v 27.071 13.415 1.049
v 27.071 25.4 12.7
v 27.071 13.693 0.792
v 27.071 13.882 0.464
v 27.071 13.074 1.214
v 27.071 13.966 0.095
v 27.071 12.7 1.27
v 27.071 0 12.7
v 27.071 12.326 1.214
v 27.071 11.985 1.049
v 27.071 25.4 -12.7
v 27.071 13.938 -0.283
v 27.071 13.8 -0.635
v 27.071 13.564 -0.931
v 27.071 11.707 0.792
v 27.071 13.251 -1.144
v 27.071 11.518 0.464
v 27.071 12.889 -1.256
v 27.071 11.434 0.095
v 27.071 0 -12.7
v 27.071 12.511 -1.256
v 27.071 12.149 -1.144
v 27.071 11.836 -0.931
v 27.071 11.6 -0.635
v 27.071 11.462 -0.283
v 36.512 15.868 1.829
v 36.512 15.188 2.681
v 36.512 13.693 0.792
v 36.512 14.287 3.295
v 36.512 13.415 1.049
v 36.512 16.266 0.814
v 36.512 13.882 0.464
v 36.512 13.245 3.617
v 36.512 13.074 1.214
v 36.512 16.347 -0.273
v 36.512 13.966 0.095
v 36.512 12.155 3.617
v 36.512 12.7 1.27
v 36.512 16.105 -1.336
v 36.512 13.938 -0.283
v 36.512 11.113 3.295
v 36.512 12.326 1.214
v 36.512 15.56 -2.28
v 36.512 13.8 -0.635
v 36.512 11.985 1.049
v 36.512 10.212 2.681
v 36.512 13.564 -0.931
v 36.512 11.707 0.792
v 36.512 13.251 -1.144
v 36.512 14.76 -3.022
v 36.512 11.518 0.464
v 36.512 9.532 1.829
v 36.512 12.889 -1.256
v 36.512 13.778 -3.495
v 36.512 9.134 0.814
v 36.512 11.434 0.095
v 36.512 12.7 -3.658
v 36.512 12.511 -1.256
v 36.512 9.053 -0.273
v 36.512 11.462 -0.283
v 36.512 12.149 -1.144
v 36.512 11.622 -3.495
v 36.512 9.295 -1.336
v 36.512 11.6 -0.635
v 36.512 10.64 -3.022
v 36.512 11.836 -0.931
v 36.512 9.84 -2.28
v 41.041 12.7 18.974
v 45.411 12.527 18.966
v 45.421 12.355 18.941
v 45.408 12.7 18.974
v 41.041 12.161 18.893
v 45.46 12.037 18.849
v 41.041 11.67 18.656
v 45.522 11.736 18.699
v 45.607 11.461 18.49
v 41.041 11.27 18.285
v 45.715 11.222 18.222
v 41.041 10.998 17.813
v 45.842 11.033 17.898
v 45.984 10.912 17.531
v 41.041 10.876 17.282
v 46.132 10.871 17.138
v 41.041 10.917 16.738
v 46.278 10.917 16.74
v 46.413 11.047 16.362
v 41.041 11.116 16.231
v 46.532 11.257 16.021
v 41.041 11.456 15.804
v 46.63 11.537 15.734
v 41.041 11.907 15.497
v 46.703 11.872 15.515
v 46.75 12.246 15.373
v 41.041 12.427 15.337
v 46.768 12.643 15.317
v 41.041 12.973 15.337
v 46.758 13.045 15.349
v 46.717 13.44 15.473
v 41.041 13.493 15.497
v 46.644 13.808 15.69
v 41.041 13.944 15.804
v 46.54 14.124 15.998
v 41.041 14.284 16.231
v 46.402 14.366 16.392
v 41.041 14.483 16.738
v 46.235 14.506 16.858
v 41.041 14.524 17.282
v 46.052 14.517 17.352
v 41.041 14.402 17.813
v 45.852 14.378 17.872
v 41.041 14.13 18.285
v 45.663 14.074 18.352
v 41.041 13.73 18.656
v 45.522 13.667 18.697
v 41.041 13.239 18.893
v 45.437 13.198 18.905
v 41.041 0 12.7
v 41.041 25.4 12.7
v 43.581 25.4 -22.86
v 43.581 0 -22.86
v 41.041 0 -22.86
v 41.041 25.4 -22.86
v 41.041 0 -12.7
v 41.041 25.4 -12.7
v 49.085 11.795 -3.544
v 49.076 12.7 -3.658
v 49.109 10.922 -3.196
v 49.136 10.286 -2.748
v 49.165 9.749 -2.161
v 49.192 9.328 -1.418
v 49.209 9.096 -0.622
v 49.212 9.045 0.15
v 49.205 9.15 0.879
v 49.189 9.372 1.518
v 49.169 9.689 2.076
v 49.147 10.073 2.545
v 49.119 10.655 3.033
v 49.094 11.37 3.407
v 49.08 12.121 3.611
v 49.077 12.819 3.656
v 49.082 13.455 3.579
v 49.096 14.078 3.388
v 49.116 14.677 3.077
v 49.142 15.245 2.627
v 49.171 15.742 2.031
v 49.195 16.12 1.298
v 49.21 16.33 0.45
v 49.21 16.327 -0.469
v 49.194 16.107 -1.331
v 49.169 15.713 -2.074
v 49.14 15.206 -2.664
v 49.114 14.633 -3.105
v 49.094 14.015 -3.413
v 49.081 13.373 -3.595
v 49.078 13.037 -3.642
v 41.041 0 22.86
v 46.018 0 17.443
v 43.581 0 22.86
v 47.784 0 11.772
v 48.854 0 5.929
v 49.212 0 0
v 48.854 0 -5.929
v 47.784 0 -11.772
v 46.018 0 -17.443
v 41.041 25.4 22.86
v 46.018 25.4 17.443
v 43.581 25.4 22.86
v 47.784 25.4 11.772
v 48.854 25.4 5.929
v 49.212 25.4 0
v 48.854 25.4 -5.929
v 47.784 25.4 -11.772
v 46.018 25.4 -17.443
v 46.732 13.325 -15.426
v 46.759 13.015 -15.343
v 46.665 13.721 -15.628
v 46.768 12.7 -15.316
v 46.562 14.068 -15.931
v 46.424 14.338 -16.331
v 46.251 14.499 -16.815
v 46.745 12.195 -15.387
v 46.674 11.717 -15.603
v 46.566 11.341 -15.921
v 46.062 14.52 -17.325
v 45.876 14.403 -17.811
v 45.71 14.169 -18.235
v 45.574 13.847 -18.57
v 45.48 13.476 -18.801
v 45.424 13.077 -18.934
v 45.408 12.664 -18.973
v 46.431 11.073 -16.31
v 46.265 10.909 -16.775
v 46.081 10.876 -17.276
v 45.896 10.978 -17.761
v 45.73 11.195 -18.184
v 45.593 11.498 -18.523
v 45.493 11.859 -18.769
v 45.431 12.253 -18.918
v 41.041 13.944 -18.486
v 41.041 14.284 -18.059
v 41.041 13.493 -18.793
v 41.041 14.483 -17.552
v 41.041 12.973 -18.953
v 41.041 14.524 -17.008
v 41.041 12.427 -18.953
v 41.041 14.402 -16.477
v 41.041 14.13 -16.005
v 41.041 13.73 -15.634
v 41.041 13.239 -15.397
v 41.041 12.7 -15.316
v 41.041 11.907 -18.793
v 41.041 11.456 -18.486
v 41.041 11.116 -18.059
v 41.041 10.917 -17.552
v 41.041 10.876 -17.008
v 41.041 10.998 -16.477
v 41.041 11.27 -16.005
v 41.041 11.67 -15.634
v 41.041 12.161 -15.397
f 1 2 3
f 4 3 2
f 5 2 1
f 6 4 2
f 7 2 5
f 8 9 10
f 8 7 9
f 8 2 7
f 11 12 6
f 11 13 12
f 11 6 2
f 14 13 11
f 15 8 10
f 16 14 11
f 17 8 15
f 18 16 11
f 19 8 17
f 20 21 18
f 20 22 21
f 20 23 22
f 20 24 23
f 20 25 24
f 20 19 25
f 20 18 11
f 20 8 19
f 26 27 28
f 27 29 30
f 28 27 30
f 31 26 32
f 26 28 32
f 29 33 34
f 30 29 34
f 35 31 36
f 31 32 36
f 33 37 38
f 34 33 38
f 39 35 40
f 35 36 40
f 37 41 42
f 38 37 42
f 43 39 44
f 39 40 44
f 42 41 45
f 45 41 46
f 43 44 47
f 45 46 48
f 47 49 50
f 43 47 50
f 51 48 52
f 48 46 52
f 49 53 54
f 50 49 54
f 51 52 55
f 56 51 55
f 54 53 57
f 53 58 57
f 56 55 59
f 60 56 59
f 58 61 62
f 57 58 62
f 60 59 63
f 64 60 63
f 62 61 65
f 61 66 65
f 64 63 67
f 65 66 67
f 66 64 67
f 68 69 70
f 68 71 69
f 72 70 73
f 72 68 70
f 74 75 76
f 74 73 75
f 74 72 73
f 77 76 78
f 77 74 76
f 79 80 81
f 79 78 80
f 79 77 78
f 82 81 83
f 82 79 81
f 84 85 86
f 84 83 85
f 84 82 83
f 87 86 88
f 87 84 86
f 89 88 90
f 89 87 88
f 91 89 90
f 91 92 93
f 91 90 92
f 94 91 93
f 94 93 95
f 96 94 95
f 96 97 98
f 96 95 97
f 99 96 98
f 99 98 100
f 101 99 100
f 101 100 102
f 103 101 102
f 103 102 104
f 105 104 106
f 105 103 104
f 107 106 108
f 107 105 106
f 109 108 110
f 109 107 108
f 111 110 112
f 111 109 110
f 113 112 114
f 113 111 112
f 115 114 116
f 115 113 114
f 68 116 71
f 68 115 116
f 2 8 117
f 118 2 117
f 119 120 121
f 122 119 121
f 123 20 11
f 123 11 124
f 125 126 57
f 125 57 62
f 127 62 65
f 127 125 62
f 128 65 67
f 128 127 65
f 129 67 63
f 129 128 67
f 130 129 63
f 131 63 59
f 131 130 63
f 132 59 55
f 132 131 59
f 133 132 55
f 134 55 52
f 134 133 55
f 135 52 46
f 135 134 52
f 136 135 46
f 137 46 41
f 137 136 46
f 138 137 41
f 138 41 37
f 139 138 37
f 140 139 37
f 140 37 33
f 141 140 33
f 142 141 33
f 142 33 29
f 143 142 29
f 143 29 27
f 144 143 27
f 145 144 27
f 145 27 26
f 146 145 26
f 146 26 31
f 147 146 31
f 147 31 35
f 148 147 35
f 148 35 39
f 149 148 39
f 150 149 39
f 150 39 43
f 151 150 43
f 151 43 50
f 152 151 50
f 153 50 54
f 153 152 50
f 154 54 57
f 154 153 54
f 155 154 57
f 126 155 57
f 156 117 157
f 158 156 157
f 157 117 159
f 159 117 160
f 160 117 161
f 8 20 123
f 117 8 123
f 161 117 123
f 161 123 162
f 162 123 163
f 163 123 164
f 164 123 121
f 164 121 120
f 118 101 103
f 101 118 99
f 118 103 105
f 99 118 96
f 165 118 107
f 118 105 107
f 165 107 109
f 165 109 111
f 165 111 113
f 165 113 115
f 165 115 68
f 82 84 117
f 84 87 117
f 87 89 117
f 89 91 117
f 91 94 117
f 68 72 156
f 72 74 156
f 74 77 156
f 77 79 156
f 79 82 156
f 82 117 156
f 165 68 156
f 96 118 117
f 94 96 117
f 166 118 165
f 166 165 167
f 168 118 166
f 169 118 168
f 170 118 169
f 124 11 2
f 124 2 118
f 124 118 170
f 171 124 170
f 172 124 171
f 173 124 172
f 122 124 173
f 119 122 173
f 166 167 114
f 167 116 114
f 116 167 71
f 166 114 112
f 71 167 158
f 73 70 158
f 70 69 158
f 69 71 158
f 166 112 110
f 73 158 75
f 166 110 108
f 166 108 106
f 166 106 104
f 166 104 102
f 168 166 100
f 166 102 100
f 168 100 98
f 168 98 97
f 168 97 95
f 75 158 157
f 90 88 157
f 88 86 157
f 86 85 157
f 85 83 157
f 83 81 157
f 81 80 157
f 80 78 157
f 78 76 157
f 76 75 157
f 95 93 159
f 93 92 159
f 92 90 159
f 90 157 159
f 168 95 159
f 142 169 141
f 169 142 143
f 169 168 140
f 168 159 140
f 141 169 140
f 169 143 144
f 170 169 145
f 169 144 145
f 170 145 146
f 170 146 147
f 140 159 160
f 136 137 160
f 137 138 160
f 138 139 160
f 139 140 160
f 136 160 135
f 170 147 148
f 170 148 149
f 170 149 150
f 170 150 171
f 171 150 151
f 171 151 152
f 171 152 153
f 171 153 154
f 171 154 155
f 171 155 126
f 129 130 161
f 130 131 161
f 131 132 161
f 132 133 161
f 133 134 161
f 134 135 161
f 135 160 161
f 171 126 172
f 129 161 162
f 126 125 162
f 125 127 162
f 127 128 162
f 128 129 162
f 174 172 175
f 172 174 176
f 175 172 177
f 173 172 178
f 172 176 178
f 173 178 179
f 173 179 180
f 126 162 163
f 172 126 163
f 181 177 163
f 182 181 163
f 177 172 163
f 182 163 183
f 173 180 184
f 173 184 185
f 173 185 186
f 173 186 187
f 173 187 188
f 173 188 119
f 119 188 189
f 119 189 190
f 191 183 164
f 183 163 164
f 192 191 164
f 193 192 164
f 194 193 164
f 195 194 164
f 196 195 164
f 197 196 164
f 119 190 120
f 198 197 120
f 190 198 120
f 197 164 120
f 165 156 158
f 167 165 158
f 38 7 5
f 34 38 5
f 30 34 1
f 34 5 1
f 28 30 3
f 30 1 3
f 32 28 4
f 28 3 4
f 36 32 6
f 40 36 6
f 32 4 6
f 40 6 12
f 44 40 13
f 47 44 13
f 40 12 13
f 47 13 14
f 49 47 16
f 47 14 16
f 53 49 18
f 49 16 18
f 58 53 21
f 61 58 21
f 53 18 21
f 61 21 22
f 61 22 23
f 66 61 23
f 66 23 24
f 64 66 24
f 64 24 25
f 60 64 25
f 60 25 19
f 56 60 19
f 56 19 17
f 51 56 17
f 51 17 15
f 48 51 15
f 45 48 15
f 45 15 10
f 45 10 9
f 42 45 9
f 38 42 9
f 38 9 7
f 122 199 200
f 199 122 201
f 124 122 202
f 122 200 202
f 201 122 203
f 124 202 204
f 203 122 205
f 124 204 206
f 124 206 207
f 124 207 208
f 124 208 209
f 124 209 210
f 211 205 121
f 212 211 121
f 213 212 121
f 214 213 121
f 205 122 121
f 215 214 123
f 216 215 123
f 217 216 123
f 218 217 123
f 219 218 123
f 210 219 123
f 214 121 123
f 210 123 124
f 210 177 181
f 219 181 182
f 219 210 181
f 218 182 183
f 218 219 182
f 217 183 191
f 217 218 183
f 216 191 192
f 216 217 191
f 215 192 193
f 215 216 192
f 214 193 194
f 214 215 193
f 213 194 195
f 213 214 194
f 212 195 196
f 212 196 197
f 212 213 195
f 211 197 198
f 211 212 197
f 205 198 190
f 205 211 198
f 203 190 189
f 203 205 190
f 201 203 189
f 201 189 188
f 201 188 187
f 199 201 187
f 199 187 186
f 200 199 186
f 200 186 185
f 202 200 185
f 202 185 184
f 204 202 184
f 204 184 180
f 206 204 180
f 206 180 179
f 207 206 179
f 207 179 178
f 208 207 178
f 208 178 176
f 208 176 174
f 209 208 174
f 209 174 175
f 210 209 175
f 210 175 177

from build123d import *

# Parameters (mm, degrees)
SKETCH2_W               = 13.97
SKETCH2_H               = 25.4
BOSS_EXTRUDE1_DEPTH     = 25.4
CUT_EXTRUDE2_REACH      = 42.718
CUT_EXTRUDE2_END_RADIUS = 49.2125
SKETCH4_R               = 1.27
CUT_EXTRUDE4_START      = -8.171649
SKETCH11_R              = 3.6576
CUT_EXTRUDE4_DEPTH      = 12.7
CUT_EXTRUDE5_REACH      = 61.913
CUT_EXTRUDE5_END_RADIUS = 49.2125
SKETCH15_R              = 1.8288


with BuildPart() as part:
    # Sketch2 → Boss-Extrude1 (new body)
    with BuildSketch(Plane(origin=(0, 0, 0), x_dir=(1, 0, 0), z_dir=(0, 1, 0))):
        with Locations((34.055850798, 0)):
            Rectangle(SKETCH2_W, SKETCH2_H)
        Polygon((43.580850798, -22.86), (43.580850798, 22.86), (41.040850798, 22.86), (41.040850798, 12.7), (41.040850798, -12.7), (41.040850798, -22.86), align=None)
        with BuildLine():
            Line((43.580850798, 22.86), (43.580850798, -22.86))
            ThreePointArc((43.580850798, -22.86), (49.2125, 0), (43.580850798, 22.86))
        make_face()
    extrude(amount=BOSS_EXTRUDE1_DEPTH)

    # Cut-Extrude2: up to this cylinder (the profile starts inside it)
    cut_extrude2_end = Plane(origin=(0, 12.7, 0), z_dir=(0, -1, 0)) * Cylinder(CUT_EXTRUDE2_END_RADIUS, 184.861, mode=Mode.PRIVATE)
    # Sketch4 → Cut-Extrude2 (cut, up to the surface)
    with BuildSketch(Plane.ZY.offset(-27.070850798), mode=Mode.PRIVATE) as cut_extrude2_sk1:
        with Locations((0, 12.7)):
            Circle(SKETCH4_R)
    cut_extrude2_tool1 = extrude(cut_extrude2_sk1.sketch, amount=-CUT_EXTRUDE2_REACH, mode=Mode.PRIVATE) & cut_extrude2_end
    add(cut_extrude2_tool1.solids().sort_by_distance((27.070851, 12.7, 0))[0], mode=Mode.SUBTRACT)

    # Sketch11 → Cut-Extrude4 (cut)
    with BuildSketch(Plane.ZY.offset(-41.040850798).offset(CUT_EXTRUDE4_START)):
        with Locations(Location((0, 12.7, 0), (0, 0, 180))):
            Circle(SKETCH11_R)
    extrude(amount=CUT_EXTRUDE4_DEPTH, mode=Mode.SUBTRACT)

    # Cut-Extrude5: up to this cylinder (the profile starts inside it)
    cut_extrude5_end = Plane(origin=(0, 12.7, 0), z_dir=(0, -1, 0)) * Cylinder(CUT_EXTRUDE5_END_RADIUS, 224.803334, mode=Mode.PRIVATE)
    # Sketch15 → Cut-Extrude5 (cut, up to the surface)
    with BuildSketch(Plane(origin=(0, 0, 0), x_dir=(0, 0, -1), z_dir=(1, 0, 0)), mode=Mode.PRIVATE) as cut_extrude5_sk1:
        with BuildLine():
            ThreePointArc((-18.9738, 12.7), (-17.145, 10.8712), (-15.3162, 12.7))
            Line((-15.3162, 12.7), (-18.9738, 12.7))
        make_face()
    cut_extrude5_tool1 = extrude(cut_extrude5_sk1.sketch, amount=CUT_EXTRUDE5_REACH, mode=Mode.PRIVATE) & cut_extrude5_end
    add(cut_extrude5_tool1.solids().sort_by_distance((0, 11.923833, 17.145))[0], mode=Mode.SUBTRACT)
    # Sketch15 → Cut-Extrude5 (cut, up to the surface)
    with BuildSketch(Plane(origin=(0, 0, 0), x_dir=(0, 0, -1), z_dir=(1, 0, 0)), mode=Mode.PRIVATE) as cut_extrude5_sk2:
        with BuildLine():
            Line((-18.9738, 12.7), (-15.3162, 12.7))
            ThreePointArc((-15.3162, 12.7), (-17.145, 14.5288), (-18.9738, 12.7))
        make_face()
    cut_extrude5_tool2 = extrude(cut_extrude5_sk2.sketch, amount=CUT_EXTRUDE5_REACH, mode=Mode.PRIVATE) & cut_extrude5_end
    add(cut_extrude5_tool2.solids().sort_by_distance((0, 13.476167, 17.145))[0], mode=Mode.SUBTRACT)
    # Sketch15 → Cut-Extrude5 (cut, up to the surface)
    with BuildSketch(Plane(origin=(0, 0, 0), x_dir=(0, 0, -1), z_dir=(1, 0, 0)), mode=Mode.PRIVATE) as cut_extrude5_sk3:
        with Locations(Location((17.145, 12.7, 0), (0, 0, 180))):
            Circle(SKETCH15_R)
    cut_extrude5_tool3 = extrude(cut_extrude5_sk3.sketch, amount=CUT_EXTRUDE5_REACH, mode=Mode.PRIVATE) & cut_extrude5_end
    add(cut_extrude5_tool3.solids().sort_by_distance((0, 12.7, -17.145))[0], mode=Mode.SUBTRACT)


solid = part.part
